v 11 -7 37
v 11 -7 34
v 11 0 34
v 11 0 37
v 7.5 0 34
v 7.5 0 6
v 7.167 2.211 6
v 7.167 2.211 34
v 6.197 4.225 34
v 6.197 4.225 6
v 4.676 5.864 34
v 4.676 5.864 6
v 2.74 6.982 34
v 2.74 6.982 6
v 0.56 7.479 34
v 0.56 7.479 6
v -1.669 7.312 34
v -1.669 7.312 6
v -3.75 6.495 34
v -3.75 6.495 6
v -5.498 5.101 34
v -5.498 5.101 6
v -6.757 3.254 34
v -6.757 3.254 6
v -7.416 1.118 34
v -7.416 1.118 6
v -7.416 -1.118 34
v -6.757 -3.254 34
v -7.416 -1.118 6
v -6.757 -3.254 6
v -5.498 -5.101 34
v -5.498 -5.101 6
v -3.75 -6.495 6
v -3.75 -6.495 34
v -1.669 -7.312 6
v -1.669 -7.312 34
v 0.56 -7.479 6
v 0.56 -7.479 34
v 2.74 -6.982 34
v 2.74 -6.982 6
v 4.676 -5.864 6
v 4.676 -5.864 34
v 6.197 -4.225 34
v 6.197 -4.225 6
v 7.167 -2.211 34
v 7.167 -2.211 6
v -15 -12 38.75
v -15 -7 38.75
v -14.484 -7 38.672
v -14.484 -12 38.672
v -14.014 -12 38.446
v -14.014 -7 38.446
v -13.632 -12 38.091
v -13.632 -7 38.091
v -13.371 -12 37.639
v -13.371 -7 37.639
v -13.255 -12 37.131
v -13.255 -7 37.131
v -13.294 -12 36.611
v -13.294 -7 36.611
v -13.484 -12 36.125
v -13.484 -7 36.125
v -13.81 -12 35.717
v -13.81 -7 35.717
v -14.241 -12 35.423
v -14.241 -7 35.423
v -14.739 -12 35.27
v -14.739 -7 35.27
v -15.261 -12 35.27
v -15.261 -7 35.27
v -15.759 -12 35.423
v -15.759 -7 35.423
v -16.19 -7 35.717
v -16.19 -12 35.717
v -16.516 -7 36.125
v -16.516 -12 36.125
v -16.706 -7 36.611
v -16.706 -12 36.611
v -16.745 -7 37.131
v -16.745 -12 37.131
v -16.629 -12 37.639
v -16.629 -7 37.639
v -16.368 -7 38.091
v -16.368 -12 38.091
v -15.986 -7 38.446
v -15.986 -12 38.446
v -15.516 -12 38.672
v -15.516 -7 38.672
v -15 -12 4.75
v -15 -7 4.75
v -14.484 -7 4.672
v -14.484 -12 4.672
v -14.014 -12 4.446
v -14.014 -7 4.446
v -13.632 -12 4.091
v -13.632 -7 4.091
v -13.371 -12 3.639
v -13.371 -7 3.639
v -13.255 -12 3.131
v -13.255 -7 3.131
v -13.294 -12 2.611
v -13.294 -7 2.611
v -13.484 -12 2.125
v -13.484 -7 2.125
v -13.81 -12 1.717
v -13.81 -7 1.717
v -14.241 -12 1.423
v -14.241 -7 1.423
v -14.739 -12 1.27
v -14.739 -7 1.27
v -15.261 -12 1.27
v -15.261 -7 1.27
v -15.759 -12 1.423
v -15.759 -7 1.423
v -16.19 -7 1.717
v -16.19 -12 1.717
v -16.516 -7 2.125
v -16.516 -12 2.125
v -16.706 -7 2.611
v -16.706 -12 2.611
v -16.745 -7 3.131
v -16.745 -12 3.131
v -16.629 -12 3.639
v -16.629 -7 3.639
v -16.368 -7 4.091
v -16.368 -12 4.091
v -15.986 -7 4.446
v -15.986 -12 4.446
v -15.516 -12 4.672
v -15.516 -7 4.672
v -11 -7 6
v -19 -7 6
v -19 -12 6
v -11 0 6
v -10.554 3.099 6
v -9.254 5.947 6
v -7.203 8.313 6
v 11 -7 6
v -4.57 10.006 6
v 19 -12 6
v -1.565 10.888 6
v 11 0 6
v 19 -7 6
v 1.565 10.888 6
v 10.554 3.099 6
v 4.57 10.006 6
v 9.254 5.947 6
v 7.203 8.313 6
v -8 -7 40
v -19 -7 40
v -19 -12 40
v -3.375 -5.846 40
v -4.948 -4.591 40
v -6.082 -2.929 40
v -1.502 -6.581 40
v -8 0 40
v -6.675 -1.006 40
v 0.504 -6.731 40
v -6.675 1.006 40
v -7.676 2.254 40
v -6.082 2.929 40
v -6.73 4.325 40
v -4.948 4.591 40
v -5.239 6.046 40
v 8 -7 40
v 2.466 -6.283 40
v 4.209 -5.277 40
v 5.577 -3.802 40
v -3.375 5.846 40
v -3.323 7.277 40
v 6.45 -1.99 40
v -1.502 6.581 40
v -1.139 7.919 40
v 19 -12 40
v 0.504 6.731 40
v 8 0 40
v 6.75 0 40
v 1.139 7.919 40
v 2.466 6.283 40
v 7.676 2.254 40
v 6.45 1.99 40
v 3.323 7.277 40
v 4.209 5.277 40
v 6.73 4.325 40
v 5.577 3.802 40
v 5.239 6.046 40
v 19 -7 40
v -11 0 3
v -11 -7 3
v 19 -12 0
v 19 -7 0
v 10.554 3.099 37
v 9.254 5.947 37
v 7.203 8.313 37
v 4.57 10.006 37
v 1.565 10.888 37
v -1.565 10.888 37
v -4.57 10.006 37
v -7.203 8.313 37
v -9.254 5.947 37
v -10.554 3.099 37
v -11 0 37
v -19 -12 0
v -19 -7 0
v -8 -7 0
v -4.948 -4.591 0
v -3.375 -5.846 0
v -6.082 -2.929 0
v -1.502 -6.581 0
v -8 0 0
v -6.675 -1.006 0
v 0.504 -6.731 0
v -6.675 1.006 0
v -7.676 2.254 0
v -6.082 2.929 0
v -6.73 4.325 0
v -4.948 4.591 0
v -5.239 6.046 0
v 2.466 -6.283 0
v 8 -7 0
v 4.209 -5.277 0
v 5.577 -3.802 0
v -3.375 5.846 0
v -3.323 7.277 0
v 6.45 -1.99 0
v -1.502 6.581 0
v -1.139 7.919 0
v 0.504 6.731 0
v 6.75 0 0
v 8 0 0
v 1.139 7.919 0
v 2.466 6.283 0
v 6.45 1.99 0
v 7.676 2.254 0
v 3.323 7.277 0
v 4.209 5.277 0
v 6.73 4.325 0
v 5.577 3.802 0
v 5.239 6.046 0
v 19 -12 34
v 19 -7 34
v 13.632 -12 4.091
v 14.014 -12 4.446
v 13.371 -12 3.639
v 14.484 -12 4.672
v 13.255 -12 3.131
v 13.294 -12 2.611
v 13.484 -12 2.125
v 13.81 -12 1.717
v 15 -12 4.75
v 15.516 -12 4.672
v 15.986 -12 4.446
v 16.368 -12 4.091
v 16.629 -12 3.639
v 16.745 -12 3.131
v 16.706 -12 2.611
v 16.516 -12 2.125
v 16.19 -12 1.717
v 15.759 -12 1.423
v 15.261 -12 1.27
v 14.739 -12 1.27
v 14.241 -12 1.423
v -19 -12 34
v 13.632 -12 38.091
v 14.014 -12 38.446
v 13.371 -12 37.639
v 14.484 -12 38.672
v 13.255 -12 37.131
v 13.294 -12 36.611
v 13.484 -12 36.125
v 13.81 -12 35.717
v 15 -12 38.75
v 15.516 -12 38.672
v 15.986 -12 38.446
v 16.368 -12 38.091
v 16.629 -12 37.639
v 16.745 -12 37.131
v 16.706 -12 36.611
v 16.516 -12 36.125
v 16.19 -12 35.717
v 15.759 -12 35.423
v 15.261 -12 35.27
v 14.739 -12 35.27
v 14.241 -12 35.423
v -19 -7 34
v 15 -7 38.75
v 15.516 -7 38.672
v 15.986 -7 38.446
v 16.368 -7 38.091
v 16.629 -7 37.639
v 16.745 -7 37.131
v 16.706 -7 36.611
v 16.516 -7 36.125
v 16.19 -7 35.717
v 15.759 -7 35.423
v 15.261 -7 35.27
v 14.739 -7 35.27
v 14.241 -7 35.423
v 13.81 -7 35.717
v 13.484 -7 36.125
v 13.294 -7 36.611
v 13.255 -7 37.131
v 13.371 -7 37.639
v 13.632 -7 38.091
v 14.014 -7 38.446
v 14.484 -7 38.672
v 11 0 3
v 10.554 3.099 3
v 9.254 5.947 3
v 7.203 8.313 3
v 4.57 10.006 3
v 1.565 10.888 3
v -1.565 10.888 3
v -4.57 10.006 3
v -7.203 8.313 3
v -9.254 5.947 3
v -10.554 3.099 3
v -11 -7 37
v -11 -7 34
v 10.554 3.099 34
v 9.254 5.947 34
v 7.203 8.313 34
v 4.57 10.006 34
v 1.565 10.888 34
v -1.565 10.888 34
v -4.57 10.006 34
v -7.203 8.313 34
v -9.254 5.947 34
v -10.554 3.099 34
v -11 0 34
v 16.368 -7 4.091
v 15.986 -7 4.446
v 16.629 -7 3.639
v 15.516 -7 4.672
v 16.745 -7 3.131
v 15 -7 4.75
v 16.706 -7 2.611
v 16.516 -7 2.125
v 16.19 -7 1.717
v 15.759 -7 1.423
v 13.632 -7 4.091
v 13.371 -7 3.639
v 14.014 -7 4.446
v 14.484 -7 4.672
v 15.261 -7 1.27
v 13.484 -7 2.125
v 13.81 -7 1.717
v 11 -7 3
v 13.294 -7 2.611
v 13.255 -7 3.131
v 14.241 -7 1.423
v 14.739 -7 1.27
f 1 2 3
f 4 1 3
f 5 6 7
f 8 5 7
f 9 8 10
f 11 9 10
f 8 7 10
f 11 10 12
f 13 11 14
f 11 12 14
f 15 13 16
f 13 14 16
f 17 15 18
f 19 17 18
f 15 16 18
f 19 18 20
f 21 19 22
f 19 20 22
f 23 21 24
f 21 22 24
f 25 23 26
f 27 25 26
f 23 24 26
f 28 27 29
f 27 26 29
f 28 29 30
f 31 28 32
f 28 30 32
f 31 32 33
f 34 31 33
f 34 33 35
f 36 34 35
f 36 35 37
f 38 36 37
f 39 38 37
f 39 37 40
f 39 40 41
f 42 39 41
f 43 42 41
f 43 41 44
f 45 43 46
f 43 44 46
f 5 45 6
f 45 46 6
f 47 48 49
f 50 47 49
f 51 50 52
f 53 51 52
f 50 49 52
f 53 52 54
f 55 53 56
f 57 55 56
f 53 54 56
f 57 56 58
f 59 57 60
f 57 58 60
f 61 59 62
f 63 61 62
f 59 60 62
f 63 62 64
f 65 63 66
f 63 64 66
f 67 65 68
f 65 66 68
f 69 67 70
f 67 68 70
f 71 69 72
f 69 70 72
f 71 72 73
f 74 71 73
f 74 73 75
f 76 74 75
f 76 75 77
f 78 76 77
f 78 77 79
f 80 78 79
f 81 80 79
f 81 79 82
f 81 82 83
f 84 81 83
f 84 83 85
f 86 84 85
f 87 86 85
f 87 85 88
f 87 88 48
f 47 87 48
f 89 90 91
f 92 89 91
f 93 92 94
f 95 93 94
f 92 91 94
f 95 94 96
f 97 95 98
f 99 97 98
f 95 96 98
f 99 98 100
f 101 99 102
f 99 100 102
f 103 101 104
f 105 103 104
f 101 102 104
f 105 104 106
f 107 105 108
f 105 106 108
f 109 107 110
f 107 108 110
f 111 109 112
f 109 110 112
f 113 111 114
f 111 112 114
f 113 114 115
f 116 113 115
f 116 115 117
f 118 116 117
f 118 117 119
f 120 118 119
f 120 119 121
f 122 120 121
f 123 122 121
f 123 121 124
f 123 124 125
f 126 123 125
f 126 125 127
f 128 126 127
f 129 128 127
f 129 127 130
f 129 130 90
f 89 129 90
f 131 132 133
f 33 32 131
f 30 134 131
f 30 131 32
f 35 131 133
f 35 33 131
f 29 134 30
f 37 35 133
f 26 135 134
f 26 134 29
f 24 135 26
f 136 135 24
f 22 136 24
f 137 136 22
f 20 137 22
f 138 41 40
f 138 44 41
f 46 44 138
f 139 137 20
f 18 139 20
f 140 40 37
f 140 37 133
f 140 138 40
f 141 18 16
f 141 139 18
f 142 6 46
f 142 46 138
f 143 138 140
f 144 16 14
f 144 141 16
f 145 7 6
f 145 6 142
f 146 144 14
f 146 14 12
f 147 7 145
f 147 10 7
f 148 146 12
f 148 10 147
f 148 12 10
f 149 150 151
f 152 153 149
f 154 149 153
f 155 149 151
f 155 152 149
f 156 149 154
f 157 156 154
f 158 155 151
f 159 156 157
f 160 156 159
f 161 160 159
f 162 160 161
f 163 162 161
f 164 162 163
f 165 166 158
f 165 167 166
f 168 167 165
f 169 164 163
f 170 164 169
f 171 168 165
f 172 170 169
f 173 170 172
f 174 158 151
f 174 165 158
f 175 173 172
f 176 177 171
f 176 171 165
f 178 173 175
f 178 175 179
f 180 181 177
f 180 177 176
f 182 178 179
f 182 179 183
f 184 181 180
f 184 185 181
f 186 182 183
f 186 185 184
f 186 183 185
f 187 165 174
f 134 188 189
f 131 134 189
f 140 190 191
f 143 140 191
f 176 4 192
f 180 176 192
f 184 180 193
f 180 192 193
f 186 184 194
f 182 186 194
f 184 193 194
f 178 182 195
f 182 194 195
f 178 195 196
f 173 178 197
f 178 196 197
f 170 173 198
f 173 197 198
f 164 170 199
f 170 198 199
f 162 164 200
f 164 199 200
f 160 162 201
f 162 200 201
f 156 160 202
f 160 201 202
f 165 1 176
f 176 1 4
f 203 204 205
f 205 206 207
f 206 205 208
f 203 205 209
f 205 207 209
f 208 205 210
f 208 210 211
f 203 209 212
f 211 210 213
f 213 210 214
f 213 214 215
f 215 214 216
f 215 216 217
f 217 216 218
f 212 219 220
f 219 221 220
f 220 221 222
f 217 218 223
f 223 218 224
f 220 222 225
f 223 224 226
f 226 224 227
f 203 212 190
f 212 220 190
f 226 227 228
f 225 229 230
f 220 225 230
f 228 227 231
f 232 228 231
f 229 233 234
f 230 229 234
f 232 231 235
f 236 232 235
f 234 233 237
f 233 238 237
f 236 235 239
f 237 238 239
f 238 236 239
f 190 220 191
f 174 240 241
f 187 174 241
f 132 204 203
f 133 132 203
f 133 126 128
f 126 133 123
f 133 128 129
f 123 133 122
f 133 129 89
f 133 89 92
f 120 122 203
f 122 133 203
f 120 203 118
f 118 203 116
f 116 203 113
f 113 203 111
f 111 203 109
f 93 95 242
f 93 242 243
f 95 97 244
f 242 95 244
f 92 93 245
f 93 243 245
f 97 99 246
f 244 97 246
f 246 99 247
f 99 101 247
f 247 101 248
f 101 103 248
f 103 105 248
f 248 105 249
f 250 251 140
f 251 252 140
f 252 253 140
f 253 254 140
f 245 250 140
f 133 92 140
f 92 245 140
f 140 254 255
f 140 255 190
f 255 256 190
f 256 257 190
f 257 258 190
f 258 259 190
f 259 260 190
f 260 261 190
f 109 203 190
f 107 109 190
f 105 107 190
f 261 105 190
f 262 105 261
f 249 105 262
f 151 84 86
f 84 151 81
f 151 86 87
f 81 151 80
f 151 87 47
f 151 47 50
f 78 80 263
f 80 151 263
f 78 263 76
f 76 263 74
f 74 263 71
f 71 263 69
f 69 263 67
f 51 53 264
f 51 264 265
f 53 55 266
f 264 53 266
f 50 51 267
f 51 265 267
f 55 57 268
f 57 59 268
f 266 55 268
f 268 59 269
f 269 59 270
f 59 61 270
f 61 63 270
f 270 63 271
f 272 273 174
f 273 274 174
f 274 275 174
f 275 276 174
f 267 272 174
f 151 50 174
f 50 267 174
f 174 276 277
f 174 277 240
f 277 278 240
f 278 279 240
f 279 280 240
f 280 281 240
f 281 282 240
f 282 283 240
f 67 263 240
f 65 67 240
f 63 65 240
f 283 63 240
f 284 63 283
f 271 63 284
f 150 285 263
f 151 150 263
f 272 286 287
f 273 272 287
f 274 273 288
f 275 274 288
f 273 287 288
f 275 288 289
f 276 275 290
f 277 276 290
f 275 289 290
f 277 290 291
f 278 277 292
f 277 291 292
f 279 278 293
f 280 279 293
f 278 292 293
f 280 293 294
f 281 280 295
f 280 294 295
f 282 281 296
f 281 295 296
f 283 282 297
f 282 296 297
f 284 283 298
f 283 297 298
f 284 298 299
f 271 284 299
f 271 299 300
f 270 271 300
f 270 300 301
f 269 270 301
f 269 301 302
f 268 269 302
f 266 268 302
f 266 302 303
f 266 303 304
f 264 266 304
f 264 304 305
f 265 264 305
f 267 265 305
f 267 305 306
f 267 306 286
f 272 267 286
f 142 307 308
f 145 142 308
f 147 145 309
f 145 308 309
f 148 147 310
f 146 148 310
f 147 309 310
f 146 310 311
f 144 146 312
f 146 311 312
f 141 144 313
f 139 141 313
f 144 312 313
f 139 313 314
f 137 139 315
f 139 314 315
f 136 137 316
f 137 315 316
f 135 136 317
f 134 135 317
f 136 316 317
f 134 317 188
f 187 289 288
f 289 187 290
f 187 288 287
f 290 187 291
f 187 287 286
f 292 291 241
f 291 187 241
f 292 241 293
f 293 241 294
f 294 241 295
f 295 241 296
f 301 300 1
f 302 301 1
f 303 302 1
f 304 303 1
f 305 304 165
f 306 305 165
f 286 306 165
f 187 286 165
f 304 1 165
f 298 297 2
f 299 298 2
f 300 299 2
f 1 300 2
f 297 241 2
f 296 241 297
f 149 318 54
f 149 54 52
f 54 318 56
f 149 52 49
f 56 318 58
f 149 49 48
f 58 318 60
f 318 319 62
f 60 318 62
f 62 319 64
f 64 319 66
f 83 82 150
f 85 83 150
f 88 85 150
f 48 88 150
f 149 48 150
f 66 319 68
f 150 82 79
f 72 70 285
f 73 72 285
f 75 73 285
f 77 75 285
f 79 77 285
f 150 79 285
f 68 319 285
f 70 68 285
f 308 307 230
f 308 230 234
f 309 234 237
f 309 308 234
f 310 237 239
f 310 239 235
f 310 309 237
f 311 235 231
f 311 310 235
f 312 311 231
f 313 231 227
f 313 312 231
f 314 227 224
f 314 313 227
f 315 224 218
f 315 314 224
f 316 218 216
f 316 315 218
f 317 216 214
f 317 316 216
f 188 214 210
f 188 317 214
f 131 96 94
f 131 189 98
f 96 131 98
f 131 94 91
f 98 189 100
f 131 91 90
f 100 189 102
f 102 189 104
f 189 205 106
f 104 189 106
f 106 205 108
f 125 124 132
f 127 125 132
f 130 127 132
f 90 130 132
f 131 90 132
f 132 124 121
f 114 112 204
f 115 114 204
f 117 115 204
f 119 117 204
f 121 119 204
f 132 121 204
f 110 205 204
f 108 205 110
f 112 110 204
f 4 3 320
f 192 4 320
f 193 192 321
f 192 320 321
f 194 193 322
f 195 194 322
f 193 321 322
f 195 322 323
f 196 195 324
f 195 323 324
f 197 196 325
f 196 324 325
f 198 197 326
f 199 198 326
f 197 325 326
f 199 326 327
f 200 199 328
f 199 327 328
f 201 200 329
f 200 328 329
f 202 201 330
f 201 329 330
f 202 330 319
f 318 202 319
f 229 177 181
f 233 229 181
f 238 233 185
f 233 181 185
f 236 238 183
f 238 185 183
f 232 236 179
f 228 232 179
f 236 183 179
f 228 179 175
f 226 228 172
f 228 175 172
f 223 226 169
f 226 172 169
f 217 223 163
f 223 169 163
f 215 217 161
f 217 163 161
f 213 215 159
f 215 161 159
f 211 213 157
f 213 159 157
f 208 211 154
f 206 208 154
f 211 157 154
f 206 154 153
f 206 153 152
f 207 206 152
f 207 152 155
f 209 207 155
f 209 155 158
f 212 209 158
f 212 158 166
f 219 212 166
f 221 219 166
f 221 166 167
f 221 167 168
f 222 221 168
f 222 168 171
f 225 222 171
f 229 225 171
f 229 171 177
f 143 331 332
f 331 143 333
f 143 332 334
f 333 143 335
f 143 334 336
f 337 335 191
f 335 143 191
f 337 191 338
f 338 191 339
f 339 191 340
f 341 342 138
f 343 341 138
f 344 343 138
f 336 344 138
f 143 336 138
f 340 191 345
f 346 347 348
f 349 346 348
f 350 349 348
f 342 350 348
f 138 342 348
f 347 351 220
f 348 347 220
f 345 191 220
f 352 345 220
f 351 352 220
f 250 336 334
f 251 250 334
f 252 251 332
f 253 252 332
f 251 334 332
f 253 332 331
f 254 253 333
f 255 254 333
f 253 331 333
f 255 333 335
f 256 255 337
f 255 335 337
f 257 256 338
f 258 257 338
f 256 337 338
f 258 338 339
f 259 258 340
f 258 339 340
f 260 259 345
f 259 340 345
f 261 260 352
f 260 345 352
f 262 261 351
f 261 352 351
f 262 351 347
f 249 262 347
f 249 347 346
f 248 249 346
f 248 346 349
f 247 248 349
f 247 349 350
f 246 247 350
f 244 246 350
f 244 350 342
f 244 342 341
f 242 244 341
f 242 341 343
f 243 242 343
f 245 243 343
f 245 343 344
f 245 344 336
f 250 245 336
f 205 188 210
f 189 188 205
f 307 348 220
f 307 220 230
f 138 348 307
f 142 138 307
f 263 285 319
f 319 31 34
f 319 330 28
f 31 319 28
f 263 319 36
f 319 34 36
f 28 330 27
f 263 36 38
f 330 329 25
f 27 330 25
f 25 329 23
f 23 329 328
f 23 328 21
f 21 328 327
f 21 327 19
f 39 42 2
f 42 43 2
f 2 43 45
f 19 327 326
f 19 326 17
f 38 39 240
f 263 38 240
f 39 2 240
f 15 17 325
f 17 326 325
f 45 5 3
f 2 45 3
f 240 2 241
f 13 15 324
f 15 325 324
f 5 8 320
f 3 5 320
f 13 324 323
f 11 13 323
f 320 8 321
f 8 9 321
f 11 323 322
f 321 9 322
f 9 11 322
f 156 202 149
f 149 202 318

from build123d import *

# Parameters (mm, degrees)
BOSS_EXTRUDE1_DEPTH = 6
SKETCH2_R           = 7.5
BOSS_EXTRUDE2_DEPTH = 28
BOSS_EXTRUDE3_DEPTH = 6
SKETCH4_R           = 6.75
CUT_EXTRUDE1_DEPTH  = 46.880278988
SKETCH6_R           = 1.75
CUT_EXTRUDE3_DEPTH  = 48.801673611
CHAMFER1_SIZE       = 3


with BuildPart() as part:
    # Sketch1 → Boss-Extrude1 (new body)
    with BuildSketch(Plane.XY):
        with BuildLine():
            Line((-11, 0), (-11, -7))
            Line((-11, -7), (-19, -7))
            Line((-19, -7), (-19, -12))
            Line((-19, -12), (-11, -12))
            Line((-11, -12), (11, -12))
            Line((11, -12), (19, -12))
            Line((19, -12), (19, -7))
            Line((19, -7), (11, -7))
            Line((11, -7), (11, 0))
            ThreePointArc((11, 0), (0, 11), (-11, 0))
        make_face()
    extrude(amount=BOSS_EXTRUDE1_DEPTH)

    # Sketch2 → Boss-Extrude2 (add)
    with BuildSketch(Plane.XY.offset(6)):
        Circle(SKETCH2_R)
    extrude(amount=BOSS_EXTRUDE2_DEPTH)

    # Sketch3 → Boss-Extrude3 (add)
    with BuildSketch(Plane.XY.offset(34)):
        with BuildLine():
            Line((-11, 0), (-11, -7))
            Line((-11, -7), (-19, -7))
            Line((-19, -7), (-19, -12))
            Line((-19, -12), (19, -12))
            Line((19, -12), (19, -7))
            Line((19, -7), (11, -7))
            Line((11, -7), (11, 0))
            ThreePointArc((11, 0), (0, 11), (-11, 0))
        make_face()
    extrude(amount=BOSS_EXTRUDE3_DEPTH)

    # Sketch4 → Cut-Extrude1 (cut, through all)
    with BuildSketch(Plane.XY.offset(40)):
        Circle(SKETCH4_R)
    extrude(amount=-CUT_EXTRUDE1_DEPTH, mode=Mode.SUBTRACT)

    # Sketch6 → Cut-Extrude3 (cut, through all)
    with BuildSketch(Plane(origin=(0, -7, 0), x_dir=(1, 0, 0), z_dir=(0, 1, 0))):
        with Locations(Location((-15, -3, 0), (0, 0, 270))):
            Circle(SKETCH6_R)
        with Locations(Location((15, -3, 0), (0, 0, 270))):
            Circle(SKETCH6_R)
        with Locations(Location((15, -37, 0), (0, 0, 270))):
            Circle(SKETCH6_R)
        with Locations(Location((-15, -37, 0), (0, 0, 270))):
            Circle(SKETCH6_R)
    extrude(amount=-CUT_EXTRUDE3_DEPTH, mode=Mode.SUBTRACT)

    # Chamfer1
    chamfer1_edges = [part.edges().sort_by_distance(p)[0] for p in [
        (-11, -3.5, 0),
        (0, 11, 0),
        (11, -3.5, 0),
        (11, -3.5, 40),
        (0, 11, 40),
        (-11, -3.5, 40),
    ]]
    chamfer(chamfer1_edges, length=CHAMFER1_SIZE)


solid = part.part
